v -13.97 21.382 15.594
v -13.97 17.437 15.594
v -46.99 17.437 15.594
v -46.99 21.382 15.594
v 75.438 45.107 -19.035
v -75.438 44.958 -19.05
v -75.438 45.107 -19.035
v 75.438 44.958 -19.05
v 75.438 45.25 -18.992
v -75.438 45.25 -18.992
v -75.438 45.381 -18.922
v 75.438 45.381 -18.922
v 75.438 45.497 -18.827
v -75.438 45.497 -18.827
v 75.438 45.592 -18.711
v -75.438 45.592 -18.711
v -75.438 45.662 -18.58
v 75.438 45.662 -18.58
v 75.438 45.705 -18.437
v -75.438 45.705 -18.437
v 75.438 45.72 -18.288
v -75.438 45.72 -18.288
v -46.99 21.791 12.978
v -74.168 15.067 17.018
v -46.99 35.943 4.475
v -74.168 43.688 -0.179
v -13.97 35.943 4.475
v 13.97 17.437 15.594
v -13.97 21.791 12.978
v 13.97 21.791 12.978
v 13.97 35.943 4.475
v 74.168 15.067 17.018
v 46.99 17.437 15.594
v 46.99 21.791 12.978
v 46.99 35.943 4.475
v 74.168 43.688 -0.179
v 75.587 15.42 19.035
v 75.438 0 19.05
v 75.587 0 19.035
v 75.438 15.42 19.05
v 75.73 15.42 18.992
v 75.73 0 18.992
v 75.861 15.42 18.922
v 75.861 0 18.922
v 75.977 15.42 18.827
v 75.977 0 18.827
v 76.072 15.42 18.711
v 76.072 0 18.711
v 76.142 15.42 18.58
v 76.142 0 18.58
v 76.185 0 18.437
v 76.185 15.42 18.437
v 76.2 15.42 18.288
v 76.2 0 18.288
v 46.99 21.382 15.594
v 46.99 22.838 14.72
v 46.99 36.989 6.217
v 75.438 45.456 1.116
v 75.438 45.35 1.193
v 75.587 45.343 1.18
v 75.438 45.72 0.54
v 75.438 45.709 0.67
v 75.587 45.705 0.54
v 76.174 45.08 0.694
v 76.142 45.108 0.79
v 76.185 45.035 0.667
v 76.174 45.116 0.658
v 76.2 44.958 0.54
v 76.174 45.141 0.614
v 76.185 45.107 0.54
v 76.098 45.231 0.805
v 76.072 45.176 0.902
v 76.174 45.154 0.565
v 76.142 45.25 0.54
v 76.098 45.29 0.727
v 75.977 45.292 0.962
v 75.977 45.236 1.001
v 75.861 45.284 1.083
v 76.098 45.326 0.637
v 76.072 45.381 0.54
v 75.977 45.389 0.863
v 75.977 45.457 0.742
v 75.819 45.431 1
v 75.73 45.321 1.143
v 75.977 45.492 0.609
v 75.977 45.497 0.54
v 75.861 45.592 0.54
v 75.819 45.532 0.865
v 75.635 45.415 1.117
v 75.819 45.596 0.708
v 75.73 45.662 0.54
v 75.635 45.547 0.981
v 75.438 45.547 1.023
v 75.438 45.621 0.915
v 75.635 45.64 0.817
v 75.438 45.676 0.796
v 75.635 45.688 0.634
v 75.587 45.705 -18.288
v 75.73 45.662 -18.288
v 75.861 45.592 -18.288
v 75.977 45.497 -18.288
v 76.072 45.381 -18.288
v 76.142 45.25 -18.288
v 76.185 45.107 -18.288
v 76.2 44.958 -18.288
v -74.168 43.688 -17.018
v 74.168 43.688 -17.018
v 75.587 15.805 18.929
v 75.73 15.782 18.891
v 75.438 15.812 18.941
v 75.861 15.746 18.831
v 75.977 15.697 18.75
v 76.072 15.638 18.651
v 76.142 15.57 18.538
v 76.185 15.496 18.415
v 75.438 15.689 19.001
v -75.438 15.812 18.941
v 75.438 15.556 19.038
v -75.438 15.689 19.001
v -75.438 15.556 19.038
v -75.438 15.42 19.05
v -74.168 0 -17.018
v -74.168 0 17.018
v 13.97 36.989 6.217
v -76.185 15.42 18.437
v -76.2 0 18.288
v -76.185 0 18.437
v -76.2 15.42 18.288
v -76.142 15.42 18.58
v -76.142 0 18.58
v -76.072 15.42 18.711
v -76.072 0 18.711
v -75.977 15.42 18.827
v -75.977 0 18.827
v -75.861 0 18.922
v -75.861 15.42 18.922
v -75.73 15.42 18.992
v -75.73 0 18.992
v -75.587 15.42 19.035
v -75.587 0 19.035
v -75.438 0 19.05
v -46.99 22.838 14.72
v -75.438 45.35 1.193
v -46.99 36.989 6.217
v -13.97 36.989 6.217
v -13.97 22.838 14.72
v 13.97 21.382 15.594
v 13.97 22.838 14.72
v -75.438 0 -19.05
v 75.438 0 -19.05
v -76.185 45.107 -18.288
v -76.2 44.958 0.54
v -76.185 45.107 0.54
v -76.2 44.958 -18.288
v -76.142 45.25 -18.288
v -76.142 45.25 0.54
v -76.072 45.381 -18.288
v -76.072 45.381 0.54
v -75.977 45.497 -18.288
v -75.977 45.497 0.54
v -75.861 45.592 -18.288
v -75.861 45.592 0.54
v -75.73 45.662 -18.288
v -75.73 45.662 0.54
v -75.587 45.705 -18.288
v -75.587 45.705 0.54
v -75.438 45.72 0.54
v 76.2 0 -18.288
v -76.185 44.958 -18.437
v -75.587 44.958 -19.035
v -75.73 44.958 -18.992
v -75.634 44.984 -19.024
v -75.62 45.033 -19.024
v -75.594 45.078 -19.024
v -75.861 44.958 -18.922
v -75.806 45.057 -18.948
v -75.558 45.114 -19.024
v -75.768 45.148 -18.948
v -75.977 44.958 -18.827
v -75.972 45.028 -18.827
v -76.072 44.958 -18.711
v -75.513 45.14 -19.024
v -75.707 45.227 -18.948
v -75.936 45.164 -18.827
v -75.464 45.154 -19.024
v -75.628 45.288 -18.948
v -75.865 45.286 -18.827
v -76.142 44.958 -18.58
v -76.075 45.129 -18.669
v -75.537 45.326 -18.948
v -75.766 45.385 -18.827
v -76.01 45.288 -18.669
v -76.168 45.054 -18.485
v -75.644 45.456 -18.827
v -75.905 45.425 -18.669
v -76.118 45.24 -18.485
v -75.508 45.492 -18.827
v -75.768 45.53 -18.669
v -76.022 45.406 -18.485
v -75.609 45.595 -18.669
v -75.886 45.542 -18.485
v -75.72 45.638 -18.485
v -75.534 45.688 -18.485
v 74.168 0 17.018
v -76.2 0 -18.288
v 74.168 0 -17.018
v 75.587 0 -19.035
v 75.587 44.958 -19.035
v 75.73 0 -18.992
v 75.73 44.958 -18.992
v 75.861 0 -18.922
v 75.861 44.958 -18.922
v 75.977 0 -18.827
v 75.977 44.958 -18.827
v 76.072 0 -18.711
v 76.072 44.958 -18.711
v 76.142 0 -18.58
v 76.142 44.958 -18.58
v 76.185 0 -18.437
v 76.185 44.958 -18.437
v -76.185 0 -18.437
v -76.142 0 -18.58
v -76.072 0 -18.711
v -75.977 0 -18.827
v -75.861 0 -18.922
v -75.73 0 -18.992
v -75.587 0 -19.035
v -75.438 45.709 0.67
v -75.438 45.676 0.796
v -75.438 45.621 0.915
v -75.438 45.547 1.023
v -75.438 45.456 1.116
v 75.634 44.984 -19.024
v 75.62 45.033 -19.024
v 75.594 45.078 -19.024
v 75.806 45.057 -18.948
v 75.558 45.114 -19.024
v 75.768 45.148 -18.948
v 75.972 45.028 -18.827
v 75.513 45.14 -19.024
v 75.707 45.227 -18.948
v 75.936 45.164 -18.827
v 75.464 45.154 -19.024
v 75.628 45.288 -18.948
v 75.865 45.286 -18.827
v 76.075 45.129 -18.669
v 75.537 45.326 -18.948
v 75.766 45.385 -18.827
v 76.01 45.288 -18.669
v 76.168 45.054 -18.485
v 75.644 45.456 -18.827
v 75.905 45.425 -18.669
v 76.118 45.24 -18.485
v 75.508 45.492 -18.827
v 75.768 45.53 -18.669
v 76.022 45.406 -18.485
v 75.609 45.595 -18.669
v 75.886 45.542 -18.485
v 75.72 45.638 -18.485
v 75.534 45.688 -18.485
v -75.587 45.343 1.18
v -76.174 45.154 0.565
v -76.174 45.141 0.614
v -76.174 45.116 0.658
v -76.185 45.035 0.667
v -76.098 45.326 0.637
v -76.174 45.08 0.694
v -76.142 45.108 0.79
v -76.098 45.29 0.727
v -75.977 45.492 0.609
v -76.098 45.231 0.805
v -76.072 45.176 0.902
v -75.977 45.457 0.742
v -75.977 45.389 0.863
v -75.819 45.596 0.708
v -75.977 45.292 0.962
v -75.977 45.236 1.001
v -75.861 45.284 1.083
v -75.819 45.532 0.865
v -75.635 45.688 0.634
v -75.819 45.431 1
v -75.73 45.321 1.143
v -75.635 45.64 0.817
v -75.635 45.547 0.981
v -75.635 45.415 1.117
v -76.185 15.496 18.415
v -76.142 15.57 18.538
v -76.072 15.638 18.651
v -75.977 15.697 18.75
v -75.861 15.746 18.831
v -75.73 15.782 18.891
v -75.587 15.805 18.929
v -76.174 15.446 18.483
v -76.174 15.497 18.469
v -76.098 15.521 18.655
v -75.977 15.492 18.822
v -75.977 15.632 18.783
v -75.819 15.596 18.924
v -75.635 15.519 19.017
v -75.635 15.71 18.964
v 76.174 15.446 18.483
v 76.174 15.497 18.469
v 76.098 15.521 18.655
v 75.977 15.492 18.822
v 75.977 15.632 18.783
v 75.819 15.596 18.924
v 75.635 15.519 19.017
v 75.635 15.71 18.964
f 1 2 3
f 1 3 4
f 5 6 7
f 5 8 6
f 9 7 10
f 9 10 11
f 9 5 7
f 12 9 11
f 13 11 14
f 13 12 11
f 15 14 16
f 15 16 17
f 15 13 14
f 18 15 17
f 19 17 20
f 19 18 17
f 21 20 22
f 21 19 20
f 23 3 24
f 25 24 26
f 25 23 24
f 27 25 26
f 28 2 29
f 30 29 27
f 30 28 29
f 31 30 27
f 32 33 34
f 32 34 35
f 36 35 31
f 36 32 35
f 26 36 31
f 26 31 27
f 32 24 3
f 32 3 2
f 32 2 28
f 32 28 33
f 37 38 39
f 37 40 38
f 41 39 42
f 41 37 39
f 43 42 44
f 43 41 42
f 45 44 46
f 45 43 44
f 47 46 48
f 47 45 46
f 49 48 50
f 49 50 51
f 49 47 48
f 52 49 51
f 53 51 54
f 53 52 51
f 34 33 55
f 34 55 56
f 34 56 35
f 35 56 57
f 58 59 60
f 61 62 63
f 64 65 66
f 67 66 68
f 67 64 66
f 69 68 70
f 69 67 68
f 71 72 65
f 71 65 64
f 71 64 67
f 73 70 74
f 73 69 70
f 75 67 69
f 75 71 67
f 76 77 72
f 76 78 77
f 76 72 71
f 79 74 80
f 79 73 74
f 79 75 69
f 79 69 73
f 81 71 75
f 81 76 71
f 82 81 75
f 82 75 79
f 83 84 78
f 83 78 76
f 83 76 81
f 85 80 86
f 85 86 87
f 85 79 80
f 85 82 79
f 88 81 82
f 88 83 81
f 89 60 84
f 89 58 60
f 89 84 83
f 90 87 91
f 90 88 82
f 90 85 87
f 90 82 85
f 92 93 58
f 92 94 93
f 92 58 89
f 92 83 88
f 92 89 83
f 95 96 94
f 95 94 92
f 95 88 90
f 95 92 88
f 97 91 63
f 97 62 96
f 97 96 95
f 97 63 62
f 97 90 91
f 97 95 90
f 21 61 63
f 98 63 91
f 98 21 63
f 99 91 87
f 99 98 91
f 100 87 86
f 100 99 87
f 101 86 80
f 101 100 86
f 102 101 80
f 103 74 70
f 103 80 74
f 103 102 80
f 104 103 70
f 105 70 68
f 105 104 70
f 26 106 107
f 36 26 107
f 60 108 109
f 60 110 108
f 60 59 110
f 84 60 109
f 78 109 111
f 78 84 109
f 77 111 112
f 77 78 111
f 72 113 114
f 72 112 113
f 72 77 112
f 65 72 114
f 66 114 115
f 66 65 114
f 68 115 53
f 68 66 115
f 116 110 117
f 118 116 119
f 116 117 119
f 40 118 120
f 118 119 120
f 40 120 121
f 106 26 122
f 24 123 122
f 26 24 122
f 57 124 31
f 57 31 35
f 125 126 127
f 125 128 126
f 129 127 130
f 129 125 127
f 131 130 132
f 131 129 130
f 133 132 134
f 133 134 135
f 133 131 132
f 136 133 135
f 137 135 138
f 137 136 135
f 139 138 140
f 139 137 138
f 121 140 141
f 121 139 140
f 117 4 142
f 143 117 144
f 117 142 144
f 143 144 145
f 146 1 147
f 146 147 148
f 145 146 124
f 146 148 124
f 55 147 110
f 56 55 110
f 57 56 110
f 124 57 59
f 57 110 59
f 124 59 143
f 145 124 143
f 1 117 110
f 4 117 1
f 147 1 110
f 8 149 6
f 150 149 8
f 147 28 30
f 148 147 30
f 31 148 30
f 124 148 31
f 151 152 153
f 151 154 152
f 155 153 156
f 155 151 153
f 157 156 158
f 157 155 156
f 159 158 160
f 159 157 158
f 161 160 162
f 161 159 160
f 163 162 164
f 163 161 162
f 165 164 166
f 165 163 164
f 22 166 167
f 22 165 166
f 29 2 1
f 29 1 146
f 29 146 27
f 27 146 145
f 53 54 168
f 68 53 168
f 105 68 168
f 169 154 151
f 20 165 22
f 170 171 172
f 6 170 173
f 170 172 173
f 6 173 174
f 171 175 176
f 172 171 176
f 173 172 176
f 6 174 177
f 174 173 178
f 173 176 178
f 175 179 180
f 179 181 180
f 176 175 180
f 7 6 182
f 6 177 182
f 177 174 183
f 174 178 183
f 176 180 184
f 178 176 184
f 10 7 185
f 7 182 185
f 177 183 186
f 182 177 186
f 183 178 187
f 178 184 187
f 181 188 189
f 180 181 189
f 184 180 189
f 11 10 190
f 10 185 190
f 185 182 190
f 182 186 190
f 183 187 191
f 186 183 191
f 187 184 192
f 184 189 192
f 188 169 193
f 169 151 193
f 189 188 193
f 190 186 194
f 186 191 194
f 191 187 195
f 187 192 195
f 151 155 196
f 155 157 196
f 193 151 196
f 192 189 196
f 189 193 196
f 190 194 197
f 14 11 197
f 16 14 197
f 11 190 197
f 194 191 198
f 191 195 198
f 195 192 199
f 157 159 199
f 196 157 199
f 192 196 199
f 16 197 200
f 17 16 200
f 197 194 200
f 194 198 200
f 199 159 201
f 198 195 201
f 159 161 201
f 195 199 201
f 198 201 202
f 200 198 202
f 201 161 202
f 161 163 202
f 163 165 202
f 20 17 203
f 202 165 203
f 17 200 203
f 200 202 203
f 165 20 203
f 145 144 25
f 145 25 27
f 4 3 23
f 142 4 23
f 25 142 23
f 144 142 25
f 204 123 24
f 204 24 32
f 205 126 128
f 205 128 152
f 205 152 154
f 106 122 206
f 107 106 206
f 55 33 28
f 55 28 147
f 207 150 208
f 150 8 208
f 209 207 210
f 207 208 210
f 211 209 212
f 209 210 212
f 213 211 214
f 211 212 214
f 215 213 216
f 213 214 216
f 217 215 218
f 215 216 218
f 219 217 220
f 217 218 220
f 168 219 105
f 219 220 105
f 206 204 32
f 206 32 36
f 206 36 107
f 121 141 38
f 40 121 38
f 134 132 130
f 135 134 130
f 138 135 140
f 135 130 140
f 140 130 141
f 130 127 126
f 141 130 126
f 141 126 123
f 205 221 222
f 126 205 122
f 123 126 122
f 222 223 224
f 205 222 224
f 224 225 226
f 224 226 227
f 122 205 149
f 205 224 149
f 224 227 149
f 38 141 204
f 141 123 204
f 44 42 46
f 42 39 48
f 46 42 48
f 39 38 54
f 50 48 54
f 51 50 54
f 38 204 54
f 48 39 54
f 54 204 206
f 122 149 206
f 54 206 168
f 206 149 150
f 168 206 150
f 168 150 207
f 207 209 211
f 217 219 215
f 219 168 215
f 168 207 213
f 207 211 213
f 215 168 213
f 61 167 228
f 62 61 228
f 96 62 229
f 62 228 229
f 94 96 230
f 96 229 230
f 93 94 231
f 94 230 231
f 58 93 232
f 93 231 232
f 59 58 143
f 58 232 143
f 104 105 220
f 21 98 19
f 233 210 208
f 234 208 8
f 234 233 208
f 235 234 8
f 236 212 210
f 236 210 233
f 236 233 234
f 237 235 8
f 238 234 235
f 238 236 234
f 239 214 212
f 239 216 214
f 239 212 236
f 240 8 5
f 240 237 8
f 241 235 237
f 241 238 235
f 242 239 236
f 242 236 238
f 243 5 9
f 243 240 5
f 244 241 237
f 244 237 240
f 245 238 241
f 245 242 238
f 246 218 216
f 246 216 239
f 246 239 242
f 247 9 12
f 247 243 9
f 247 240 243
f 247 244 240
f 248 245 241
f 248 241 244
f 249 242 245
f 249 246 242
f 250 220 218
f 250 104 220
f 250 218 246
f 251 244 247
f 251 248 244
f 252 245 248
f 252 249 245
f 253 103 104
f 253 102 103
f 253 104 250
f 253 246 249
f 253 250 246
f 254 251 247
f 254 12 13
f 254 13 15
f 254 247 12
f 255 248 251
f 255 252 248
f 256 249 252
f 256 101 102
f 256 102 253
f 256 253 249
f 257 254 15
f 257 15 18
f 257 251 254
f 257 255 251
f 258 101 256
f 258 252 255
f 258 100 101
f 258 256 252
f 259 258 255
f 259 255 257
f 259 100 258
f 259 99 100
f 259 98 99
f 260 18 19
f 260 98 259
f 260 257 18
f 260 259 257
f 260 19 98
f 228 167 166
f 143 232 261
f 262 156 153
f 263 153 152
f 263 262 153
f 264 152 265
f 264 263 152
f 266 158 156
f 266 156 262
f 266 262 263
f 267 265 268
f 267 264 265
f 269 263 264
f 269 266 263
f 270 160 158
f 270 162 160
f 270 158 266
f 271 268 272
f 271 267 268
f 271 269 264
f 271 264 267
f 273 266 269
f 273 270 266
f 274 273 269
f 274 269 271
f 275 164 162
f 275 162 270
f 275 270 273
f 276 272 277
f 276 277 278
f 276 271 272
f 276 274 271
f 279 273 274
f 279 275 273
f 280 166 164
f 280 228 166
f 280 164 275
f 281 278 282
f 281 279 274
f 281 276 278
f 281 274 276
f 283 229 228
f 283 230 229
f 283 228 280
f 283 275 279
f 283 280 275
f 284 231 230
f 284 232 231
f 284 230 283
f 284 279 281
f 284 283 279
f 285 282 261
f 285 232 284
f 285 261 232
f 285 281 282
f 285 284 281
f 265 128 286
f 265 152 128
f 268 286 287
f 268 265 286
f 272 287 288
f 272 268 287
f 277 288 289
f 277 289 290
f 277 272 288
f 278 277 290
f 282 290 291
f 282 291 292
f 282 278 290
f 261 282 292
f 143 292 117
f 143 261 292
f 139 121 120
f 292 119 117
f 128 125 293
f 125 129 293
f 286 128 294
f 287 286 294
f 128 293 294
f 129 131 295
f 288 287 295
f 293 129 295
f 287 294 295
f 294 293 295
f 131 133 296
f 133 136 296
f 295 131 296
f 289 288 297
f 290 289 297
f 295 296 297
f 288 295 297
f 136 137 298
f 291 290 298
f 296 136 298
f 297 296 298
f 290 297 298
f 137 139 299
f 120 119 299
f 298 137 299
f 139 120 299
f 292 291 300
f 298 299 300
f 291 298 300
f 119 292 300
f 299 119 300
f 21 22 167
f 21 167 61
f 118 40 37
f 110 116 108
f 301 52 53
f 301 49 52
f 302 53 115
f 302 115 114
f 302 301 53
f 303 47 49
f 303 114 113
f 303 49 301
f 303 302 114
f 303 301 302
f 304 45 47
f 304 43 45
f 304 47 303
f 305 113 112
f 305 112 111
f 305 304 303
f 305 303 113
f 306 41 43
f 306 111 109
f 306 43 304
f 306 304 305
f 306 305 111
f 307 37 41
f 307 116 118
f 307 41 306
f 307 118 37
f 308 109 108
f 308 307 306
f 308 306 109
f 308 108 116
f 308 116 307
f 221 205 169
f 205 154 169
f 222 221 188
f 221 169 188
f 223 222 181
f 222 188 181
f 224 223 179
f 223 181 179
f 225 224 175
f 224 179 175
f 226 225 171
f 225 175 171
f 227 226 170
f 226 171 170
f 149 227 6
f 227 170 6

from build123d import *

# Parameters (mm, degrees)
SKETCH1_W           = 152.4
SKETCH1_H           = 38.1
BOSS_EXTRUDE1_DEPTH = 45.72
CUT_EXTRUDE1_REACH  = 162.247
SHELL1_T            = -2.032
CUT_EXTRUDE2_REACH  = 94.207
SKETCH4_W           = 33.02
SKETCH4_H           = 16.51
FILLET1_R           = 0.762
CHAMFER1_SIZE       = 5.08
CHAMFER1_SIZE_2     = 3.052371945


with BuildPart() as part:
    # Sketch1 → Boss-Extrude1 (new body)
    with BuildSketch(Plane(origin=(0, 0, 0), x_dir=(1, 0, 0), z_dir=(0, 1, 0))):
        Rectangle(SKETCH1_W, SKETCH1_H)
    extrude(amount=BOSS_EXTRUDE1_DEPTH)

    # Sketch3 → Cut-Extrude1 (cut, up to next)
    with BuildSketch(Plane(origin=(76.2, 0, 0), x_dir=(0, 0, -1), z_dir=(1, 0, 0)), mode=Mode.PRIVATE) as cut_extrude1_sk1:
        Polygon((-19.05, 15.63096767), (-0.970685408, 45.72), (-19.05, 45.72), align=None)
    cut_extrude1_tool1 = extrude(cut_extrude1_sk1.sketch, amount=-CUT_EXTRUDE1_REACH, mode=Mode.PRIVATE) & part.part
    add(cut_extrude1_tool1.solids().sort_by_distance((76.2, 35.690323, 13.023562))[0], mode=Mode.SUBTRACT)

    # Shell1
    shell1_openings = [part.faces().sort_by_distance(p)[0] for p in [
        (0, 0, 0),
    ]]
    offset(amount=SHELL1_T, openings=shell1_openings, kind=Kind.INTERSECTION)

    # Sketch4 → Cut-Extrude2 (cut, up to next)
    with BuildSketch(Plane(origin=(0, 12.556412247, 20.897379275), x_dir=(1, 0, 0), z_dir=(0, 0.5150380749100518, 0.8571673007021139)), mode=Mode.PRIVATE) as cut_extrude2_sk1:
        with Locations((-30.48, 20.249314041)):
            Rectangle(SKETCH4_W, SKETCH4_H)
    cut_extrude2_tool1 = extrude(cut_extrude2_sk1.sketch, amount=-CUT_EXTRUDE2_REACH, mode=Mode.PRIVATE) & part.part
    # Sketch4 → Cut-Extrude2 (cut, up to next)
    with BuildSketch(Plane(origin=(0, 12.556412247, 20.897379275), x_dir=(1, 0, 0), z_dir=(0, 0.5150380749100518, 0.8571673007021139)), mode=Mode.PRIVATE) as cut_extrude2_sk2:
        with Locations((30.48, 20.249314041)):
            Rectangle(SKETCH4_W, SKETCH4_H)
    cut_extrude2_tool2 = extrude(cut_extrude2_sk2.sketch, amount=-CUT_EXTRUDE2_REACH, mode=Mode.PRIVATE) & part.part
    add(cut_extrude2_tool1.solids().sort_by_distance((-30.48, 29.913462, 10.468212))[0], mode=Mode.SUBTRACT)
    add(cut_extrude2_tool2.solids().sort_by_distance((30.48, 29.913462, 10.468212))[0], mode=Mode.SUBTRACT)

    # Fillet1
    fillet1_edges = [part.edges().sort_by_distance(p)[0] for p in [
        (-76.2, 45.72, -9.039657296),
        (76.2, 45.72, -9.039657296),
        (76.2, 7.815483835, 19.05),
        (-76.2, 7.815483835, 19.05),
        (-76.2, 30.675483835, 10.010342704),
        (0, 45.72, 0.970685408),
        (76.2, 30.675483835, 10.010342704),
        (0, 15.63096767, 19.05),
        (-76.2, 22.86, -19.05),
        (76.2, 22.86, -19.05),
        (0, 45.72, -19.05),
    ]]
    fillet(fillet1_edges, radius=FILLET1_R)

    # Chamfer1
    # the kernel refuses this chamfer: 5.08, 3.052371945 mm, written as the material it takes off along each edge
    with BuildSketch(Plane(origin=(46.99, 21.790988669, 12.978086906), x_dir=(0, -0.8672541037770177, 0.4978657645208413), z_dir=(-1, 0, 0)), Plane(origin=(-13.97, 21.790988669, 12.978086906), x_dir=(0, -0.8672541037770181, 0.49786576452084075), z_dir=(-1, 0, 0))) as chamfer1_piece_1:
        Polygon((CHAMFER1_SIZE * 0.99980168408, CHAMFER1_SIZE * 0.0199146305808), (-CHAMFER1_SIZE_2 * 0.0199146305786, CHAMFER1_SIZE_2 * 0.999801683968), (0, 0), align=None)
    extrude(amount=33.02, mode=Mode.SUBTRACT)


solid = part.part
